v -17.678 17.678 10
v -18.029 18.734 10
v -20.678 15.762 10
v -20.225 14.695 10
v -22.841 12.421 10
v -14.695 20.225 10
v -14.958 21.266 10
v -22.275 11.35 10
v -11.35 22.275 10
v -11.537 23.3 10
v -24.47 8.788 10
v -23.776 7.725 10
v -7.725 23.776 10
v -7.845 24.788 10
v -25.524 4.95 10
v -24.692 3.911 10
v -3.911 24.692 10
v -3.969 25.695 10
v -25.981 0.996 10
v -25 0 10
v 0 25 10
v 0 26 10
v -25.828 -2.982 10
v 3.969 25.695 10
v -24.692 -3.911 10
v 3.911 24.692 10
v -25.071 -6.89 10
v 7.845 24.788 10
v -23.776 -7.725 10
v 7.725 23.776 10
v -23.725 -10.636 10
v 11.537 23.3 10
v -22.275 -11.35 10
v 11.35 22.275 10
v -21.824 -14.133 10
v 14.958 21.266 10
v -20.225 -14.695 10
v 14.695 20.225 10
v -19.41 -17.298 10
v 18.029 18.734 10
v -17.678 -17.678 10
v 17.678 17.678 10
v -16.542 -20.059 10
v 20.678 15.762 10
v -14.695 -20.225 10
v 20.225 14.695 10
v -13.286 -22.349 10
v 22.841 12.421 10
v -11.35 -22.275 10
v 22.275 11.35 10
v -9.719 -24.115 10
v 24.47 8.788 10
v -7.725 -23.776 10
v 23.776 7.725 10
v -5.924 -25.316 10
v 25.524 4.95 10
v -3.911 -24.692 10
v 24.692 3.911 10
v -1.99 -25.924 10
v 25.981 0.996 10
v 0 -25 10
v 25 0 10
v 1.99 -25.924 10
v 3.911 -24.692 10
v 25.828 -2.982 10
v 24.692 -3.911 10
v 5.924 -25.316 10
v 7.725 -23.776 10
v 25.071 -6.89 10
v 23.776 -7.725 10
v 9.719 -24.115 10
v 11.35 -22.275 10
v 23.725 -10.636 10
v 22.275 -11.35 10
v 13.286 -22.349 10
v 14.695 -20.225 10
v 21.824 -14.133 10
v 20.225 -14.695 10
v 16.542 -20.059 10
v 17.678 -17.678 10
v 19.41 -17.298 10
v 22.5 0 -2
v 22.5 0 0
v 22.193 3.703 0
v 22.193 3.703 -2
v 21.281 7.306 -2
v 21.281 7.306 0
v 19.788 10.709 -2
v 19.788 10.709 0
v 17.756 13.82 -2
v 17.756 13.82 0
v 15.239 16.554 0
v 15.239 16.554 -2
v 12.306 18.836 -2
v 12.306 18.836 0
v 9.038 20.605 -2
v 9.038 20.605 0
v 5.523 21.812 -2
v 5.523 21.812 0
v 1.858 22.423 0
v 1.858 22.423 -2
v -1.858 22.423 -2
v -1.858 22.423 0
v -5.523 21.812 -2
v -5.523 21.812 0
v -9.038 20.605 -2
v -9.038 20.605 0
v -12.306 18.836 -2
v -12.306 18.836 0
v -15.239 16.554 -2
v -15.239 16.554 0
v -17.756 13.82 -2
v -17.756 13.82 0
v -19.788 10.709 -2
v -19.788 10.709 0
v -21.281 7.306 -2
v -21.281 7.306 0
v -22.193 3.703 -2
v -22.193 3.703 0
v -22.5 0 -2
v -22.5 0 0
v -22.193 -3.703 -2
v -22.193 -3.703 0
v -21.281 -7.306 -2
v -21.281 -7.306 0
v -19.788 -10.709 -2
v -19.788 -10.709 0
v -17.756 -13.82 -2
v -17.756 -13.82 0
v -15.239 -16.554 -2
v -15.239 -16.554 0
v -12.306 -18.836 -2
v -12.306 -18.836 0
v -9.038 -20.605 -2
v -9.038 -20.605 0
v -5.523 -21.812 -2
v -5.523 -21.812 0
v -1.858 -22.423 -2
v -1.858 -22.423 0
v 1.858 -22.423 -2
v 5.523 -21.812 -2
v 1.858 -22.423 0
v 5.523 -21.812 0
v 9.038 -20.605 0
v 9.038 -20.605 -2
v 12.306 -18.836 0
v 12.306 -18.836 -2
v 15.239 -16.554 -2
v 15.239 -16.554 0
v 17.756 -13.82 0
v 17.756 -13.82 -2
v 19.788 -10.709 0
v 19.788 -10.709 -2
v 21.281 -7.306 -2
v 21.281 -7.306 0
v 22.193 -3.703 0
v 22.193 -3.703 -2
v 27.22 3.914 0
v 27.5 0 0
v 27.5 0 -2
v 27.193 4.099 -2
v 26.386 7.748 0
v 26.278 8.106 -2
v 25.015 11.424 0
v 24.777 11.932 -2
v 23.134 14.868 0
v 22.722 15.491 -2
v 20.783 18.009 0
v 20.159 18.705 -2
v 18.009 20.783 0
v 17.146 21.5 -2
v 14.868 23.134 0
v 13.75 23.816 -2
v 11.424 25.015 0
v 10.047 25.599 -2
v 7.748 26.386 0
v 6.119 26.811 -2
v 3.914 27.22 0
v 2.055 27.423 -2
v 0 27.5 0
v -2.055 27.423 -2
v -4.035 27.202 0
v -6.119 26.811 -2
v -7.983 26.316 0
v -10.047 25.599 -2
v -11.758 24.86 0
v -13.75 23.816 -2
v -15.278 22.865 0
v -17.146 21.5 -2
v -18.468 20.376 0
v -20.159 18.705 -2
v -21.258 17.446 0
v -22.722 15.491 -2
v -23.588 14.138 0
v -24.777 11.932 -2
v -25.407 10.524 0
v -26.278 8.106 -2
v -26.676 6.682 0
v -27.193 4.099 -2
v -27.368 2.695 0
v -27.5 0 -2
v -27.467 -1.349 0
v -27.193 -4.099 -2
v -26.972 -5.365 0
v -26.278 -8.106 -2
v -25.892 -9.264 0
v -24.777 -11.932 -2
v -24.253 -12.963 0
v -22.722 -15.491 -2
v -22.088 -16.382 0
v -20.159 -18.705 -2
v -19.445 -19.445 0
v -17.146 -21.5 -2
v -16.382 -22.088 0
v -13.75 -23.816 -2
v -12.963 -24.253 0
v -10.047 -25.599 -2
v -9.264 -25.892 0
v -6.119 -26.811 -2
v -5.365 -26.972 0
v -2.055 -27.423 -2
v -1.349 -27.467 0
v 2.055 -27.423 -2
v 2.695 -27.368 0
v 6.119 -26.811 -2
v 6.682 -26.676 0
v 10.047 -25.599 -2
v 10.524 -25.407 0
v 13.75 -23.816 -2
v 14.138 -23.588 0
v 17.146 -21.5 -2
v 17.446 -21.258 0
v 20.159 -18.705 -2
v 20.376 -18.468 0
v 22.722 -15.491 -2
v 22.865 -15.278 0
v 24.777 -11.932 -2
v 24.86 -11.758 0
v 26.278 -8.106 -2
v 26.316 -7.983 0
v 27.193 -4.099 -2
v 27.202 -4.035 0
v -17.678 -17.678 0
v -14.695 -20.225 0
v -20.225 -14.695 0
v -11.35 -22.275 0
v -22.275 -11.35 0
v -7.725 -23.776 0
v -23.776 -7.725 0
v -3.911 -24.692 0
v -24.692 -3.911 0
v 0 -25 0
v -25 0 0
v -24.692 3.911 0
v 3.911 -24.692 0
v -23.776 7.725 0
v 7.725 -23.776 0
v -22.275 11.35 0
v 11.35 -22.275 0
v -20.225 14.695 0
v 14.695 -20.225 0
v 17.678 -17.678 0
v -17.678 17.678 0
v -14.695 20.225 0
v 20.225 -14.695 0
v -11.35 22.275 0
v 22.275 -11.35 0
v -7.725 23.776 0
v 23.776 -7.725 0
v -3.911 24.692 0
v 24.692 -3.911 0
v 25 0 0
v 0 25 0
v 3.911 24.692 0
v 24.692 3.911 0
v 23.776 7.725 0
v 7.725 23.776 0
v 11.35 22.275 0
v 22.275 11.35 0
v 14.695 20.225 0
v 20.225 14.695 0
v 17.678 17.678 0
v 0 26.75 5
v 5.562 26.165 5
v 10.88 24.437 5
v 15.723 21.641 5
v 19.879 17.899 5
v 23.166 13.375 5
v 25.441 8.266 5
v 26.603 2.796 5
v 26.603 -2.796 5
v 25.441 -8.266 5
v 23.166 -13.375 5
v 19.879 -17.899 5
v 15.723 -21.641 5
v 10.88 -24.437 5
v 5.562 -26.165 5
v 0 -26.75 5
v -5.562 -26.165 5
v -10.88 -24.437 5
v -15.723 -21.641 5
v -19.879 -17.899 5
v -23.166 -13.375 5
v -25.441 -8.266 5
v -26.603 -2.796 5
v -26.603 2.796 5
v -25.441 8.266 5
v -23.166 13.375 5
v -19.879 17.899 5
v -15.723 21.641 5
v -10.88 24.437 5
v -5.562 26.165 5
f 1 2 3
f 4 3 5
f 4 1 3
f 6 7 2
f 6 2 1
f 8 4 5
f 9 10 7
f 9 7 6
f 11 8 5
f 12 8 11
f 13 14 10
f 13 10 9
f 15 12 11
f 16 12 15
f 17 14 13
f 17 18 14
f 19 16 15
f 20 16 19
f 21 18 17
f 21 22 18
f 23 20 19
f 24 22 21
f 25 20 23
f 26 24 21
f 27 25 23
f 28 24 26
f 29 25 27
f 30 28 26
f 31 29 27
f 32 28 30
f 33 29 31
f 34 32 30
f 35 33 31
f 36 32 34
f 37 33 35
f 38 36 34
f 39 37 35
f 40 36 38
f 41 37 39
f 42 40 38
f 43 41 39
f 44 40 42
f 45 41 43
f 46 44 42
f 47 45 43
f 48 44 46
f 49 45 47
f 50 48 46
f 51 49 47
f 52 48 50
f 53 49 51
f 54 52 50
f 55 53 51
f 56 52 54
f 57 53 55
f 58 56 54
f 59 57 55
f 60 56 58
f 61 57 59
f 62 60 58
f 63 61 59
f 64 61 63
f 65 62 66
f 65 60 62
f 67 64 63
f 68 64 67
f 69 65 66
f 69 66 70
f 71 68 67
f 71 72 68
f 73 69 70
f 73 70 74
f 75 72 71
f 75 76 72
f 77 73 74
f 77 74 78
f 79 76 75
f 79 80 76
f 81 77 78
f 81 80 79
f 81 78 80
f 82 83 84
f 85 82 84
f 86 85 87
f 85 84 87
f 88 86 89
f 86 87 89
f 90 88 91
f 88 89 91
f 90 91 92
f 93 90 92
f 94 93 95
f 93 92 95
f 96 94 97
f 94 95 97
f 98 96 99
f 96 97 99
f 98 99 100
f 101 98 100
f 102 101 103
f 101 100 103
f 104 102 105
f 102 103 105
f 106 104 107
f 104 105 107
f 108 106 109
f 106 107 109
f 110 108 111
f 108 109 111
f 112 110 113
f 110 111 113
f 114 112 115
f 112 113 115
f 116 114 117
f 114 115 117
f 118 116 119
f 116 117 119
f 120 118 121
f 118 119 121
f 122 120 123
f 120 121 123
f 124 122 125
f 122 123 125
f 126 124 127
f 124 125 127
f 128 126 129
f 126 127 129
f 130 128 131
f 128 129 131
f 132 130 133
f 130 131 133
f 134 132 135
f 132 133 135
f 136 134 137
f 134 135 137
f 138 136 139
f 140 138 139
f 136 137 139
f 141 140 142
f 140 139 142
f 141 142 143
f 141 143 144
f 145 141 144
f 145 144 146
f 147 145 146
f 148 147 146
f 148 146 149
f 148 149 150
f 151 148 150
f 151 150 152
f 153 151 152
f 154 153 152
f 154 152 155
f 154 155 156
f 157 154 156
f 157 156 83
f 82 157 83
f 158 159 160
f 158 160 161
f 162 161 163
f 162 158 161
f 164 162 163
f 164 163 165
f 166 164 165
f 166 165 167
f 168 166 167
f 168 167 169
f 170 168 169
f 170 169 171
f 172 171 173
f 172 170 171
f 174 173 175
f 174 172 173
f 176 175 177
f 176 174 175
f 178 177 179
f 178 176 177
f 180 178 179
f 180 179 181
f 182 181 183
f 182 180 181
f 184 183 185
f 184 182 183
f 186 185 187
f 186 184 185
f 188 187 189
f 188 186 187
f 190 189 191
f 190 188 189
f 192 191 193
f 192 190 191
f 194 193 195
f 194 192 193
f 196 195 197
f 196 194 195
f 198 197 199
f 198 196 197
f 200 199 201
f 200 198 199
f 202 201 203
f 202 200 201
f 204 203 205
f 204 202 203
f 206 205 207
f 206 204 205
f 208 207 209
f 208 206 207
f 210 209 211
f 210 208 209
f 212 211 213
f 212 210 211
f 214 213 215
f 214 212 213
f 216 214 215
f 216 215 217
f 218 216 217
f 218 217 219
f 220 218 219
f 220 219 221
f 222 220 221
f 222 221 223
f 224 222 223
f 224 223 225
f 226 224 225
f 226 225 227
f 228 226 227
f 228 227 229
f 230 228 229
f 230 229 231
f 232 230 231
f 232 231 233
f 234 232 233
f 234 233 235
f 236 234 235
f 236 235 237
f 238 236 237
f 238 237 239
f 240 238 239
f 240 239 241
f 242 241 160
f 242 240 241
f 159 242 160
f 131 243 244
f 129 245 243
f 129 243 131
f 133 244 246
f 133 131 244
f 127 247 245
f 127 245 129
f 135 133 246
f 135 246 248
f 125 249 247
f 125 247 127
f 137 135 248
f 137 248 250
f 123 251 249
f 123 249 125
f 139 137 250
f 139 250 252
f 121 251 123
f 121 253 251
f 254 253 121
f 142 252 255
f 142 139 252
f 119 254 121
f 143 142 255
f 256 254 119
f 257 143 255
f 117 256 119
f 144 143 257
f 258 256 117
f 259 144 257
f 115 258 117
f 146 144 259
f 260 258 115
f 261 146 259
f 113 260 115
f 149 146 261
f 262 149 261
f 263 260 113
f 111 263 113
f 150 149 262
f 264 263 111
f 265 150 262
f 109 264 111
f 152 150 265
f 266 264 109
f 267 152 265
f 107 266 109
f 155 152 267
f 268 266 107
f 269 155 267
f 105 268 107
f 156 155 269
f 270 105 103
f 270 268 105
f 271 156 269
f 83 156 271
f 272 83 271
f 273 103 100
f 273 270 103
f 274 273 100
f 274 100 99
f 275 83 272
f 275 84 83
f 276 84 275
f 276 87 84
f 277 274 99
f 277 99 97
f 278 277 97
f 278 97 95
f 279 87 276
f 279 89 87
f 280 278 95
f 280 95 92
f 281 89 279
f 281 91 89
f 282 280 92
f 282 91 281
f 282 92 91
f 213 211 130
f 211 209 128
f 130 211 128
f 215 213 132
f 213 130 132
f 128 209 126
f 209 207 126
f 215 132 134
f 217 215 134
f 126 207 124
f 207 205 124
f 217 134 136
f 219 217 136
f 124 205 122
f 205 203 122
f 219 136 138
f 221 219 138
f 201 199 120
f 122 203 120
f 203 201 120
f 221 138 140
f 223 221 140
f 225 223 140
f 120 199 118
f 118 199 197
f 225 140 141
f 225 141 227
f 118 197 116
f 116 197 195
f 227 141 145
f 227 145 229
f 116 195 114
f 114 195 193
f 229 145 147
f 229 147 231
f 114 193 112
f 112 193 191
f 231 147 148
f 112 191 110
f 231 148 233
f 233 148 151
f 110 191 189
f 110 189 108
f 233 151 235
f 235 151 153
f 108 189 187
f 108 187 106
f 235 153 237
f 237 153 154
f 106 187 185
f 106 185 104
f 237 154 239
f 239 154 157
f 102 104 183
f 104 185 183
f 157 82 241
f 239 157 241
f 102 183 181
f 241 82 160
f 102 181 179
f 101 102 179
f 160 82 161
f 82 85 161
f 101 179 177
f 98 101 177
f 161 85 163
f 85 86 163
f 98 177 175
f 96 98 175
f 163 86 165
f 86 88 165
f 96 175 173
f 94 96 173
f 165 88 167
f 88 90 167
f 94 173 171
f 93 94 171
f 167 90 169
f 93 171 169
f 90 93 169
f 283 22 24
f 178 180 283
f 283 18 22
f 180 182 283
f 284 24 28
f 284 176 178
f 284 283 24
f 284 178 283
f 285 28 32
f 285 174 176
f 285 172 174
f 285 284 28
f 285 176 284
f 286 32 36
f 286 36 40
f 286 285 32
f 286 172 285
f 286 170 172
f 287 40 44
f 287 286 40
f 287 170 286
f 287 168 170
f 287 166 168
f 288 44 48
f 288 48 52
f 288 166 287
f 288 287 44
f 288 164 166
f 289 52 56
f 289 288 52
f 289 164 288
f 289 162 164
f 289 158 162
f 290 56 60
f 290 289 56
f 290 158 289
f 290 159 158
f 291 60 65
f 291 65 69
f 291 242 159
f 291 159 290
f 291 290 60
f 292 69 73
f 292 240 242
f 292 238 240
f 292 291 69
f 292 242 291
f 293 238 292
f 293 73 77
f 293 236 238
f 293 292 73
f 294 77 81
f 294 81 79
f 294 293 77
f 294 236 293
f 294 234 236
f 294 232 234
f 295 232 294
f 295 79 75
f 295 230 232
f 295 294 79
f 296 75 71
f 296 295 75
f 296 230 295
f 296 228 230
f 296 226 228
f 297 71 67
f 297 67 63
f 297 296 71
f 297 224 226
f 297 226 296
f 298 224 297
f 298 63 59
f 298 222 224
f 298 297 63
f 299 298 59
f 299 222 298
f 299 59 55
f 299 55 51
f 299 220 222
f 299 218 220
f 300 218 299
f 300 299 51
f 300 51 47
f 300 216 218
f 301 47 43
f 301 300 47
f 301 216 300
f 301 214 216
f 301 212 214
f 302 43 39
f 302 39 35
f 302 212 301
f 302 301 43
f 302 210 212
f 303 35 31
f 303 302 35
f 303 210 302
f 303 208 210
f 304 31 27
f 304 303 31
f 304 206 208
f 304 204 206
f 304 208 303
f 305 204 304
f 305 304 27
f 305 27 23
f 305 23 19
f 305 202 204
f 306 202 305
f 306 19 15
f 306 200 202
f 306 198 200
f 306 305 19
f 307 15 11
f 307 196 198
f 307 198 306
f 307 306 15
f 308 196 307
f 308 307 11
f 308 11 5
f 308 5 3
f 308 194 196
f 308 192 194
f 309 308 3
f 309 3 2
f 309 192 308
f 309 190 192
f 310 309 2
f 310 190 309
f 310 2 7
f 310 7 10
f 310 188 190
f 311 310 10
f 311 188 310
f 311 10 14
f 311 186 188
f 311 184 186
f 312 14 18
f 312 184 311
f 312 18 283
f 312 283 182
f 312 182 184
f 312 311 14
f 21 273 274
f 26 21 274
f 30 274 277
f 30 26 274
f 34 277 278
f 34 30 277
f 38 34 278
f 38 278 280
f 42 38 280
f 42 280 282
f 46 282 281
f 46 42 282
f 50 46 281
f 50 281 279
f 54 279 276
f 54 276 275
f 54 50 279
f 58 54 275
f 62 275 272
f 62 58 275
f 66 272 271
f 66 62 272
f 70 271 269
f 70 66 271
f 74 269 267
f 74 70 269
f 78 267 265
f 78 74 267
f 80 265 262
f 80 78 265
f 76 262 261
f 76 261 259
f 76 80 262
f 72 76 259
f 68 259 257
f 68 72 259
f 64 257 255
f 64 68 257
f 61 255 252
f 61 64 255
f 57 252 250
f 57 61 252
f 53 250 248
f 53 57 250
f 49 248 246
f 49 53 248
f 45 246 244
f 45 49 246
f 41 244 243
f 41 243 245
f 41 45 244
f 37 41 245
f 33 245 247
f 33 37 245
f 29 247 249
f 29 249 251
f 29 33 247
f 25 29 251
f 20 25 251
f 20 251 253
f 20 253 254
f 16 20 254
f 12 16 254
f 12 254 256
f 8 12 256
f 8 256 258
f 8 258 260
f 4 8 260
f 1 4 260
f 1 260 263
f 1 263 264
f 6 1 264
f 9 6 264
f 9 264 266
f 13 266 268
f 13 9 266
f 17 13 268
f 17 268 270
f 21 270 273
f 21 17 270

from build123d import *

# Parameters (mm, degrees)
SKETCH_1_R      = 27.5
SKETCH_1_R_2    = 22.5
EXTRUDE_1_DEPTH = 2


with BuildPart() as part:
    # 草圖5 → 旋轉2 (revolve)
    with BuildSketch(Plane(origin=(0, 0, 0), x_dir=(0, 0, -1), z_dir=(1, 0, 0))):
        Polygon((-10, 26), (0, 27.5), (0, 25), (-10, 25), align=None)
    revolve(axis=Axis((0, 0, 10), (0, 0, -1)))

    # 草圖1 → 填料-伸長1 (add)
    with BuildSketch(Plane.XY):
        Circle(SKETCH_1_R)
        Circle(SKETCH_1_R_2, mode=Mode.SUBTRACT)
    extrude(amount=-EXTRUDE_1_DEPTH)


solid = part.part
